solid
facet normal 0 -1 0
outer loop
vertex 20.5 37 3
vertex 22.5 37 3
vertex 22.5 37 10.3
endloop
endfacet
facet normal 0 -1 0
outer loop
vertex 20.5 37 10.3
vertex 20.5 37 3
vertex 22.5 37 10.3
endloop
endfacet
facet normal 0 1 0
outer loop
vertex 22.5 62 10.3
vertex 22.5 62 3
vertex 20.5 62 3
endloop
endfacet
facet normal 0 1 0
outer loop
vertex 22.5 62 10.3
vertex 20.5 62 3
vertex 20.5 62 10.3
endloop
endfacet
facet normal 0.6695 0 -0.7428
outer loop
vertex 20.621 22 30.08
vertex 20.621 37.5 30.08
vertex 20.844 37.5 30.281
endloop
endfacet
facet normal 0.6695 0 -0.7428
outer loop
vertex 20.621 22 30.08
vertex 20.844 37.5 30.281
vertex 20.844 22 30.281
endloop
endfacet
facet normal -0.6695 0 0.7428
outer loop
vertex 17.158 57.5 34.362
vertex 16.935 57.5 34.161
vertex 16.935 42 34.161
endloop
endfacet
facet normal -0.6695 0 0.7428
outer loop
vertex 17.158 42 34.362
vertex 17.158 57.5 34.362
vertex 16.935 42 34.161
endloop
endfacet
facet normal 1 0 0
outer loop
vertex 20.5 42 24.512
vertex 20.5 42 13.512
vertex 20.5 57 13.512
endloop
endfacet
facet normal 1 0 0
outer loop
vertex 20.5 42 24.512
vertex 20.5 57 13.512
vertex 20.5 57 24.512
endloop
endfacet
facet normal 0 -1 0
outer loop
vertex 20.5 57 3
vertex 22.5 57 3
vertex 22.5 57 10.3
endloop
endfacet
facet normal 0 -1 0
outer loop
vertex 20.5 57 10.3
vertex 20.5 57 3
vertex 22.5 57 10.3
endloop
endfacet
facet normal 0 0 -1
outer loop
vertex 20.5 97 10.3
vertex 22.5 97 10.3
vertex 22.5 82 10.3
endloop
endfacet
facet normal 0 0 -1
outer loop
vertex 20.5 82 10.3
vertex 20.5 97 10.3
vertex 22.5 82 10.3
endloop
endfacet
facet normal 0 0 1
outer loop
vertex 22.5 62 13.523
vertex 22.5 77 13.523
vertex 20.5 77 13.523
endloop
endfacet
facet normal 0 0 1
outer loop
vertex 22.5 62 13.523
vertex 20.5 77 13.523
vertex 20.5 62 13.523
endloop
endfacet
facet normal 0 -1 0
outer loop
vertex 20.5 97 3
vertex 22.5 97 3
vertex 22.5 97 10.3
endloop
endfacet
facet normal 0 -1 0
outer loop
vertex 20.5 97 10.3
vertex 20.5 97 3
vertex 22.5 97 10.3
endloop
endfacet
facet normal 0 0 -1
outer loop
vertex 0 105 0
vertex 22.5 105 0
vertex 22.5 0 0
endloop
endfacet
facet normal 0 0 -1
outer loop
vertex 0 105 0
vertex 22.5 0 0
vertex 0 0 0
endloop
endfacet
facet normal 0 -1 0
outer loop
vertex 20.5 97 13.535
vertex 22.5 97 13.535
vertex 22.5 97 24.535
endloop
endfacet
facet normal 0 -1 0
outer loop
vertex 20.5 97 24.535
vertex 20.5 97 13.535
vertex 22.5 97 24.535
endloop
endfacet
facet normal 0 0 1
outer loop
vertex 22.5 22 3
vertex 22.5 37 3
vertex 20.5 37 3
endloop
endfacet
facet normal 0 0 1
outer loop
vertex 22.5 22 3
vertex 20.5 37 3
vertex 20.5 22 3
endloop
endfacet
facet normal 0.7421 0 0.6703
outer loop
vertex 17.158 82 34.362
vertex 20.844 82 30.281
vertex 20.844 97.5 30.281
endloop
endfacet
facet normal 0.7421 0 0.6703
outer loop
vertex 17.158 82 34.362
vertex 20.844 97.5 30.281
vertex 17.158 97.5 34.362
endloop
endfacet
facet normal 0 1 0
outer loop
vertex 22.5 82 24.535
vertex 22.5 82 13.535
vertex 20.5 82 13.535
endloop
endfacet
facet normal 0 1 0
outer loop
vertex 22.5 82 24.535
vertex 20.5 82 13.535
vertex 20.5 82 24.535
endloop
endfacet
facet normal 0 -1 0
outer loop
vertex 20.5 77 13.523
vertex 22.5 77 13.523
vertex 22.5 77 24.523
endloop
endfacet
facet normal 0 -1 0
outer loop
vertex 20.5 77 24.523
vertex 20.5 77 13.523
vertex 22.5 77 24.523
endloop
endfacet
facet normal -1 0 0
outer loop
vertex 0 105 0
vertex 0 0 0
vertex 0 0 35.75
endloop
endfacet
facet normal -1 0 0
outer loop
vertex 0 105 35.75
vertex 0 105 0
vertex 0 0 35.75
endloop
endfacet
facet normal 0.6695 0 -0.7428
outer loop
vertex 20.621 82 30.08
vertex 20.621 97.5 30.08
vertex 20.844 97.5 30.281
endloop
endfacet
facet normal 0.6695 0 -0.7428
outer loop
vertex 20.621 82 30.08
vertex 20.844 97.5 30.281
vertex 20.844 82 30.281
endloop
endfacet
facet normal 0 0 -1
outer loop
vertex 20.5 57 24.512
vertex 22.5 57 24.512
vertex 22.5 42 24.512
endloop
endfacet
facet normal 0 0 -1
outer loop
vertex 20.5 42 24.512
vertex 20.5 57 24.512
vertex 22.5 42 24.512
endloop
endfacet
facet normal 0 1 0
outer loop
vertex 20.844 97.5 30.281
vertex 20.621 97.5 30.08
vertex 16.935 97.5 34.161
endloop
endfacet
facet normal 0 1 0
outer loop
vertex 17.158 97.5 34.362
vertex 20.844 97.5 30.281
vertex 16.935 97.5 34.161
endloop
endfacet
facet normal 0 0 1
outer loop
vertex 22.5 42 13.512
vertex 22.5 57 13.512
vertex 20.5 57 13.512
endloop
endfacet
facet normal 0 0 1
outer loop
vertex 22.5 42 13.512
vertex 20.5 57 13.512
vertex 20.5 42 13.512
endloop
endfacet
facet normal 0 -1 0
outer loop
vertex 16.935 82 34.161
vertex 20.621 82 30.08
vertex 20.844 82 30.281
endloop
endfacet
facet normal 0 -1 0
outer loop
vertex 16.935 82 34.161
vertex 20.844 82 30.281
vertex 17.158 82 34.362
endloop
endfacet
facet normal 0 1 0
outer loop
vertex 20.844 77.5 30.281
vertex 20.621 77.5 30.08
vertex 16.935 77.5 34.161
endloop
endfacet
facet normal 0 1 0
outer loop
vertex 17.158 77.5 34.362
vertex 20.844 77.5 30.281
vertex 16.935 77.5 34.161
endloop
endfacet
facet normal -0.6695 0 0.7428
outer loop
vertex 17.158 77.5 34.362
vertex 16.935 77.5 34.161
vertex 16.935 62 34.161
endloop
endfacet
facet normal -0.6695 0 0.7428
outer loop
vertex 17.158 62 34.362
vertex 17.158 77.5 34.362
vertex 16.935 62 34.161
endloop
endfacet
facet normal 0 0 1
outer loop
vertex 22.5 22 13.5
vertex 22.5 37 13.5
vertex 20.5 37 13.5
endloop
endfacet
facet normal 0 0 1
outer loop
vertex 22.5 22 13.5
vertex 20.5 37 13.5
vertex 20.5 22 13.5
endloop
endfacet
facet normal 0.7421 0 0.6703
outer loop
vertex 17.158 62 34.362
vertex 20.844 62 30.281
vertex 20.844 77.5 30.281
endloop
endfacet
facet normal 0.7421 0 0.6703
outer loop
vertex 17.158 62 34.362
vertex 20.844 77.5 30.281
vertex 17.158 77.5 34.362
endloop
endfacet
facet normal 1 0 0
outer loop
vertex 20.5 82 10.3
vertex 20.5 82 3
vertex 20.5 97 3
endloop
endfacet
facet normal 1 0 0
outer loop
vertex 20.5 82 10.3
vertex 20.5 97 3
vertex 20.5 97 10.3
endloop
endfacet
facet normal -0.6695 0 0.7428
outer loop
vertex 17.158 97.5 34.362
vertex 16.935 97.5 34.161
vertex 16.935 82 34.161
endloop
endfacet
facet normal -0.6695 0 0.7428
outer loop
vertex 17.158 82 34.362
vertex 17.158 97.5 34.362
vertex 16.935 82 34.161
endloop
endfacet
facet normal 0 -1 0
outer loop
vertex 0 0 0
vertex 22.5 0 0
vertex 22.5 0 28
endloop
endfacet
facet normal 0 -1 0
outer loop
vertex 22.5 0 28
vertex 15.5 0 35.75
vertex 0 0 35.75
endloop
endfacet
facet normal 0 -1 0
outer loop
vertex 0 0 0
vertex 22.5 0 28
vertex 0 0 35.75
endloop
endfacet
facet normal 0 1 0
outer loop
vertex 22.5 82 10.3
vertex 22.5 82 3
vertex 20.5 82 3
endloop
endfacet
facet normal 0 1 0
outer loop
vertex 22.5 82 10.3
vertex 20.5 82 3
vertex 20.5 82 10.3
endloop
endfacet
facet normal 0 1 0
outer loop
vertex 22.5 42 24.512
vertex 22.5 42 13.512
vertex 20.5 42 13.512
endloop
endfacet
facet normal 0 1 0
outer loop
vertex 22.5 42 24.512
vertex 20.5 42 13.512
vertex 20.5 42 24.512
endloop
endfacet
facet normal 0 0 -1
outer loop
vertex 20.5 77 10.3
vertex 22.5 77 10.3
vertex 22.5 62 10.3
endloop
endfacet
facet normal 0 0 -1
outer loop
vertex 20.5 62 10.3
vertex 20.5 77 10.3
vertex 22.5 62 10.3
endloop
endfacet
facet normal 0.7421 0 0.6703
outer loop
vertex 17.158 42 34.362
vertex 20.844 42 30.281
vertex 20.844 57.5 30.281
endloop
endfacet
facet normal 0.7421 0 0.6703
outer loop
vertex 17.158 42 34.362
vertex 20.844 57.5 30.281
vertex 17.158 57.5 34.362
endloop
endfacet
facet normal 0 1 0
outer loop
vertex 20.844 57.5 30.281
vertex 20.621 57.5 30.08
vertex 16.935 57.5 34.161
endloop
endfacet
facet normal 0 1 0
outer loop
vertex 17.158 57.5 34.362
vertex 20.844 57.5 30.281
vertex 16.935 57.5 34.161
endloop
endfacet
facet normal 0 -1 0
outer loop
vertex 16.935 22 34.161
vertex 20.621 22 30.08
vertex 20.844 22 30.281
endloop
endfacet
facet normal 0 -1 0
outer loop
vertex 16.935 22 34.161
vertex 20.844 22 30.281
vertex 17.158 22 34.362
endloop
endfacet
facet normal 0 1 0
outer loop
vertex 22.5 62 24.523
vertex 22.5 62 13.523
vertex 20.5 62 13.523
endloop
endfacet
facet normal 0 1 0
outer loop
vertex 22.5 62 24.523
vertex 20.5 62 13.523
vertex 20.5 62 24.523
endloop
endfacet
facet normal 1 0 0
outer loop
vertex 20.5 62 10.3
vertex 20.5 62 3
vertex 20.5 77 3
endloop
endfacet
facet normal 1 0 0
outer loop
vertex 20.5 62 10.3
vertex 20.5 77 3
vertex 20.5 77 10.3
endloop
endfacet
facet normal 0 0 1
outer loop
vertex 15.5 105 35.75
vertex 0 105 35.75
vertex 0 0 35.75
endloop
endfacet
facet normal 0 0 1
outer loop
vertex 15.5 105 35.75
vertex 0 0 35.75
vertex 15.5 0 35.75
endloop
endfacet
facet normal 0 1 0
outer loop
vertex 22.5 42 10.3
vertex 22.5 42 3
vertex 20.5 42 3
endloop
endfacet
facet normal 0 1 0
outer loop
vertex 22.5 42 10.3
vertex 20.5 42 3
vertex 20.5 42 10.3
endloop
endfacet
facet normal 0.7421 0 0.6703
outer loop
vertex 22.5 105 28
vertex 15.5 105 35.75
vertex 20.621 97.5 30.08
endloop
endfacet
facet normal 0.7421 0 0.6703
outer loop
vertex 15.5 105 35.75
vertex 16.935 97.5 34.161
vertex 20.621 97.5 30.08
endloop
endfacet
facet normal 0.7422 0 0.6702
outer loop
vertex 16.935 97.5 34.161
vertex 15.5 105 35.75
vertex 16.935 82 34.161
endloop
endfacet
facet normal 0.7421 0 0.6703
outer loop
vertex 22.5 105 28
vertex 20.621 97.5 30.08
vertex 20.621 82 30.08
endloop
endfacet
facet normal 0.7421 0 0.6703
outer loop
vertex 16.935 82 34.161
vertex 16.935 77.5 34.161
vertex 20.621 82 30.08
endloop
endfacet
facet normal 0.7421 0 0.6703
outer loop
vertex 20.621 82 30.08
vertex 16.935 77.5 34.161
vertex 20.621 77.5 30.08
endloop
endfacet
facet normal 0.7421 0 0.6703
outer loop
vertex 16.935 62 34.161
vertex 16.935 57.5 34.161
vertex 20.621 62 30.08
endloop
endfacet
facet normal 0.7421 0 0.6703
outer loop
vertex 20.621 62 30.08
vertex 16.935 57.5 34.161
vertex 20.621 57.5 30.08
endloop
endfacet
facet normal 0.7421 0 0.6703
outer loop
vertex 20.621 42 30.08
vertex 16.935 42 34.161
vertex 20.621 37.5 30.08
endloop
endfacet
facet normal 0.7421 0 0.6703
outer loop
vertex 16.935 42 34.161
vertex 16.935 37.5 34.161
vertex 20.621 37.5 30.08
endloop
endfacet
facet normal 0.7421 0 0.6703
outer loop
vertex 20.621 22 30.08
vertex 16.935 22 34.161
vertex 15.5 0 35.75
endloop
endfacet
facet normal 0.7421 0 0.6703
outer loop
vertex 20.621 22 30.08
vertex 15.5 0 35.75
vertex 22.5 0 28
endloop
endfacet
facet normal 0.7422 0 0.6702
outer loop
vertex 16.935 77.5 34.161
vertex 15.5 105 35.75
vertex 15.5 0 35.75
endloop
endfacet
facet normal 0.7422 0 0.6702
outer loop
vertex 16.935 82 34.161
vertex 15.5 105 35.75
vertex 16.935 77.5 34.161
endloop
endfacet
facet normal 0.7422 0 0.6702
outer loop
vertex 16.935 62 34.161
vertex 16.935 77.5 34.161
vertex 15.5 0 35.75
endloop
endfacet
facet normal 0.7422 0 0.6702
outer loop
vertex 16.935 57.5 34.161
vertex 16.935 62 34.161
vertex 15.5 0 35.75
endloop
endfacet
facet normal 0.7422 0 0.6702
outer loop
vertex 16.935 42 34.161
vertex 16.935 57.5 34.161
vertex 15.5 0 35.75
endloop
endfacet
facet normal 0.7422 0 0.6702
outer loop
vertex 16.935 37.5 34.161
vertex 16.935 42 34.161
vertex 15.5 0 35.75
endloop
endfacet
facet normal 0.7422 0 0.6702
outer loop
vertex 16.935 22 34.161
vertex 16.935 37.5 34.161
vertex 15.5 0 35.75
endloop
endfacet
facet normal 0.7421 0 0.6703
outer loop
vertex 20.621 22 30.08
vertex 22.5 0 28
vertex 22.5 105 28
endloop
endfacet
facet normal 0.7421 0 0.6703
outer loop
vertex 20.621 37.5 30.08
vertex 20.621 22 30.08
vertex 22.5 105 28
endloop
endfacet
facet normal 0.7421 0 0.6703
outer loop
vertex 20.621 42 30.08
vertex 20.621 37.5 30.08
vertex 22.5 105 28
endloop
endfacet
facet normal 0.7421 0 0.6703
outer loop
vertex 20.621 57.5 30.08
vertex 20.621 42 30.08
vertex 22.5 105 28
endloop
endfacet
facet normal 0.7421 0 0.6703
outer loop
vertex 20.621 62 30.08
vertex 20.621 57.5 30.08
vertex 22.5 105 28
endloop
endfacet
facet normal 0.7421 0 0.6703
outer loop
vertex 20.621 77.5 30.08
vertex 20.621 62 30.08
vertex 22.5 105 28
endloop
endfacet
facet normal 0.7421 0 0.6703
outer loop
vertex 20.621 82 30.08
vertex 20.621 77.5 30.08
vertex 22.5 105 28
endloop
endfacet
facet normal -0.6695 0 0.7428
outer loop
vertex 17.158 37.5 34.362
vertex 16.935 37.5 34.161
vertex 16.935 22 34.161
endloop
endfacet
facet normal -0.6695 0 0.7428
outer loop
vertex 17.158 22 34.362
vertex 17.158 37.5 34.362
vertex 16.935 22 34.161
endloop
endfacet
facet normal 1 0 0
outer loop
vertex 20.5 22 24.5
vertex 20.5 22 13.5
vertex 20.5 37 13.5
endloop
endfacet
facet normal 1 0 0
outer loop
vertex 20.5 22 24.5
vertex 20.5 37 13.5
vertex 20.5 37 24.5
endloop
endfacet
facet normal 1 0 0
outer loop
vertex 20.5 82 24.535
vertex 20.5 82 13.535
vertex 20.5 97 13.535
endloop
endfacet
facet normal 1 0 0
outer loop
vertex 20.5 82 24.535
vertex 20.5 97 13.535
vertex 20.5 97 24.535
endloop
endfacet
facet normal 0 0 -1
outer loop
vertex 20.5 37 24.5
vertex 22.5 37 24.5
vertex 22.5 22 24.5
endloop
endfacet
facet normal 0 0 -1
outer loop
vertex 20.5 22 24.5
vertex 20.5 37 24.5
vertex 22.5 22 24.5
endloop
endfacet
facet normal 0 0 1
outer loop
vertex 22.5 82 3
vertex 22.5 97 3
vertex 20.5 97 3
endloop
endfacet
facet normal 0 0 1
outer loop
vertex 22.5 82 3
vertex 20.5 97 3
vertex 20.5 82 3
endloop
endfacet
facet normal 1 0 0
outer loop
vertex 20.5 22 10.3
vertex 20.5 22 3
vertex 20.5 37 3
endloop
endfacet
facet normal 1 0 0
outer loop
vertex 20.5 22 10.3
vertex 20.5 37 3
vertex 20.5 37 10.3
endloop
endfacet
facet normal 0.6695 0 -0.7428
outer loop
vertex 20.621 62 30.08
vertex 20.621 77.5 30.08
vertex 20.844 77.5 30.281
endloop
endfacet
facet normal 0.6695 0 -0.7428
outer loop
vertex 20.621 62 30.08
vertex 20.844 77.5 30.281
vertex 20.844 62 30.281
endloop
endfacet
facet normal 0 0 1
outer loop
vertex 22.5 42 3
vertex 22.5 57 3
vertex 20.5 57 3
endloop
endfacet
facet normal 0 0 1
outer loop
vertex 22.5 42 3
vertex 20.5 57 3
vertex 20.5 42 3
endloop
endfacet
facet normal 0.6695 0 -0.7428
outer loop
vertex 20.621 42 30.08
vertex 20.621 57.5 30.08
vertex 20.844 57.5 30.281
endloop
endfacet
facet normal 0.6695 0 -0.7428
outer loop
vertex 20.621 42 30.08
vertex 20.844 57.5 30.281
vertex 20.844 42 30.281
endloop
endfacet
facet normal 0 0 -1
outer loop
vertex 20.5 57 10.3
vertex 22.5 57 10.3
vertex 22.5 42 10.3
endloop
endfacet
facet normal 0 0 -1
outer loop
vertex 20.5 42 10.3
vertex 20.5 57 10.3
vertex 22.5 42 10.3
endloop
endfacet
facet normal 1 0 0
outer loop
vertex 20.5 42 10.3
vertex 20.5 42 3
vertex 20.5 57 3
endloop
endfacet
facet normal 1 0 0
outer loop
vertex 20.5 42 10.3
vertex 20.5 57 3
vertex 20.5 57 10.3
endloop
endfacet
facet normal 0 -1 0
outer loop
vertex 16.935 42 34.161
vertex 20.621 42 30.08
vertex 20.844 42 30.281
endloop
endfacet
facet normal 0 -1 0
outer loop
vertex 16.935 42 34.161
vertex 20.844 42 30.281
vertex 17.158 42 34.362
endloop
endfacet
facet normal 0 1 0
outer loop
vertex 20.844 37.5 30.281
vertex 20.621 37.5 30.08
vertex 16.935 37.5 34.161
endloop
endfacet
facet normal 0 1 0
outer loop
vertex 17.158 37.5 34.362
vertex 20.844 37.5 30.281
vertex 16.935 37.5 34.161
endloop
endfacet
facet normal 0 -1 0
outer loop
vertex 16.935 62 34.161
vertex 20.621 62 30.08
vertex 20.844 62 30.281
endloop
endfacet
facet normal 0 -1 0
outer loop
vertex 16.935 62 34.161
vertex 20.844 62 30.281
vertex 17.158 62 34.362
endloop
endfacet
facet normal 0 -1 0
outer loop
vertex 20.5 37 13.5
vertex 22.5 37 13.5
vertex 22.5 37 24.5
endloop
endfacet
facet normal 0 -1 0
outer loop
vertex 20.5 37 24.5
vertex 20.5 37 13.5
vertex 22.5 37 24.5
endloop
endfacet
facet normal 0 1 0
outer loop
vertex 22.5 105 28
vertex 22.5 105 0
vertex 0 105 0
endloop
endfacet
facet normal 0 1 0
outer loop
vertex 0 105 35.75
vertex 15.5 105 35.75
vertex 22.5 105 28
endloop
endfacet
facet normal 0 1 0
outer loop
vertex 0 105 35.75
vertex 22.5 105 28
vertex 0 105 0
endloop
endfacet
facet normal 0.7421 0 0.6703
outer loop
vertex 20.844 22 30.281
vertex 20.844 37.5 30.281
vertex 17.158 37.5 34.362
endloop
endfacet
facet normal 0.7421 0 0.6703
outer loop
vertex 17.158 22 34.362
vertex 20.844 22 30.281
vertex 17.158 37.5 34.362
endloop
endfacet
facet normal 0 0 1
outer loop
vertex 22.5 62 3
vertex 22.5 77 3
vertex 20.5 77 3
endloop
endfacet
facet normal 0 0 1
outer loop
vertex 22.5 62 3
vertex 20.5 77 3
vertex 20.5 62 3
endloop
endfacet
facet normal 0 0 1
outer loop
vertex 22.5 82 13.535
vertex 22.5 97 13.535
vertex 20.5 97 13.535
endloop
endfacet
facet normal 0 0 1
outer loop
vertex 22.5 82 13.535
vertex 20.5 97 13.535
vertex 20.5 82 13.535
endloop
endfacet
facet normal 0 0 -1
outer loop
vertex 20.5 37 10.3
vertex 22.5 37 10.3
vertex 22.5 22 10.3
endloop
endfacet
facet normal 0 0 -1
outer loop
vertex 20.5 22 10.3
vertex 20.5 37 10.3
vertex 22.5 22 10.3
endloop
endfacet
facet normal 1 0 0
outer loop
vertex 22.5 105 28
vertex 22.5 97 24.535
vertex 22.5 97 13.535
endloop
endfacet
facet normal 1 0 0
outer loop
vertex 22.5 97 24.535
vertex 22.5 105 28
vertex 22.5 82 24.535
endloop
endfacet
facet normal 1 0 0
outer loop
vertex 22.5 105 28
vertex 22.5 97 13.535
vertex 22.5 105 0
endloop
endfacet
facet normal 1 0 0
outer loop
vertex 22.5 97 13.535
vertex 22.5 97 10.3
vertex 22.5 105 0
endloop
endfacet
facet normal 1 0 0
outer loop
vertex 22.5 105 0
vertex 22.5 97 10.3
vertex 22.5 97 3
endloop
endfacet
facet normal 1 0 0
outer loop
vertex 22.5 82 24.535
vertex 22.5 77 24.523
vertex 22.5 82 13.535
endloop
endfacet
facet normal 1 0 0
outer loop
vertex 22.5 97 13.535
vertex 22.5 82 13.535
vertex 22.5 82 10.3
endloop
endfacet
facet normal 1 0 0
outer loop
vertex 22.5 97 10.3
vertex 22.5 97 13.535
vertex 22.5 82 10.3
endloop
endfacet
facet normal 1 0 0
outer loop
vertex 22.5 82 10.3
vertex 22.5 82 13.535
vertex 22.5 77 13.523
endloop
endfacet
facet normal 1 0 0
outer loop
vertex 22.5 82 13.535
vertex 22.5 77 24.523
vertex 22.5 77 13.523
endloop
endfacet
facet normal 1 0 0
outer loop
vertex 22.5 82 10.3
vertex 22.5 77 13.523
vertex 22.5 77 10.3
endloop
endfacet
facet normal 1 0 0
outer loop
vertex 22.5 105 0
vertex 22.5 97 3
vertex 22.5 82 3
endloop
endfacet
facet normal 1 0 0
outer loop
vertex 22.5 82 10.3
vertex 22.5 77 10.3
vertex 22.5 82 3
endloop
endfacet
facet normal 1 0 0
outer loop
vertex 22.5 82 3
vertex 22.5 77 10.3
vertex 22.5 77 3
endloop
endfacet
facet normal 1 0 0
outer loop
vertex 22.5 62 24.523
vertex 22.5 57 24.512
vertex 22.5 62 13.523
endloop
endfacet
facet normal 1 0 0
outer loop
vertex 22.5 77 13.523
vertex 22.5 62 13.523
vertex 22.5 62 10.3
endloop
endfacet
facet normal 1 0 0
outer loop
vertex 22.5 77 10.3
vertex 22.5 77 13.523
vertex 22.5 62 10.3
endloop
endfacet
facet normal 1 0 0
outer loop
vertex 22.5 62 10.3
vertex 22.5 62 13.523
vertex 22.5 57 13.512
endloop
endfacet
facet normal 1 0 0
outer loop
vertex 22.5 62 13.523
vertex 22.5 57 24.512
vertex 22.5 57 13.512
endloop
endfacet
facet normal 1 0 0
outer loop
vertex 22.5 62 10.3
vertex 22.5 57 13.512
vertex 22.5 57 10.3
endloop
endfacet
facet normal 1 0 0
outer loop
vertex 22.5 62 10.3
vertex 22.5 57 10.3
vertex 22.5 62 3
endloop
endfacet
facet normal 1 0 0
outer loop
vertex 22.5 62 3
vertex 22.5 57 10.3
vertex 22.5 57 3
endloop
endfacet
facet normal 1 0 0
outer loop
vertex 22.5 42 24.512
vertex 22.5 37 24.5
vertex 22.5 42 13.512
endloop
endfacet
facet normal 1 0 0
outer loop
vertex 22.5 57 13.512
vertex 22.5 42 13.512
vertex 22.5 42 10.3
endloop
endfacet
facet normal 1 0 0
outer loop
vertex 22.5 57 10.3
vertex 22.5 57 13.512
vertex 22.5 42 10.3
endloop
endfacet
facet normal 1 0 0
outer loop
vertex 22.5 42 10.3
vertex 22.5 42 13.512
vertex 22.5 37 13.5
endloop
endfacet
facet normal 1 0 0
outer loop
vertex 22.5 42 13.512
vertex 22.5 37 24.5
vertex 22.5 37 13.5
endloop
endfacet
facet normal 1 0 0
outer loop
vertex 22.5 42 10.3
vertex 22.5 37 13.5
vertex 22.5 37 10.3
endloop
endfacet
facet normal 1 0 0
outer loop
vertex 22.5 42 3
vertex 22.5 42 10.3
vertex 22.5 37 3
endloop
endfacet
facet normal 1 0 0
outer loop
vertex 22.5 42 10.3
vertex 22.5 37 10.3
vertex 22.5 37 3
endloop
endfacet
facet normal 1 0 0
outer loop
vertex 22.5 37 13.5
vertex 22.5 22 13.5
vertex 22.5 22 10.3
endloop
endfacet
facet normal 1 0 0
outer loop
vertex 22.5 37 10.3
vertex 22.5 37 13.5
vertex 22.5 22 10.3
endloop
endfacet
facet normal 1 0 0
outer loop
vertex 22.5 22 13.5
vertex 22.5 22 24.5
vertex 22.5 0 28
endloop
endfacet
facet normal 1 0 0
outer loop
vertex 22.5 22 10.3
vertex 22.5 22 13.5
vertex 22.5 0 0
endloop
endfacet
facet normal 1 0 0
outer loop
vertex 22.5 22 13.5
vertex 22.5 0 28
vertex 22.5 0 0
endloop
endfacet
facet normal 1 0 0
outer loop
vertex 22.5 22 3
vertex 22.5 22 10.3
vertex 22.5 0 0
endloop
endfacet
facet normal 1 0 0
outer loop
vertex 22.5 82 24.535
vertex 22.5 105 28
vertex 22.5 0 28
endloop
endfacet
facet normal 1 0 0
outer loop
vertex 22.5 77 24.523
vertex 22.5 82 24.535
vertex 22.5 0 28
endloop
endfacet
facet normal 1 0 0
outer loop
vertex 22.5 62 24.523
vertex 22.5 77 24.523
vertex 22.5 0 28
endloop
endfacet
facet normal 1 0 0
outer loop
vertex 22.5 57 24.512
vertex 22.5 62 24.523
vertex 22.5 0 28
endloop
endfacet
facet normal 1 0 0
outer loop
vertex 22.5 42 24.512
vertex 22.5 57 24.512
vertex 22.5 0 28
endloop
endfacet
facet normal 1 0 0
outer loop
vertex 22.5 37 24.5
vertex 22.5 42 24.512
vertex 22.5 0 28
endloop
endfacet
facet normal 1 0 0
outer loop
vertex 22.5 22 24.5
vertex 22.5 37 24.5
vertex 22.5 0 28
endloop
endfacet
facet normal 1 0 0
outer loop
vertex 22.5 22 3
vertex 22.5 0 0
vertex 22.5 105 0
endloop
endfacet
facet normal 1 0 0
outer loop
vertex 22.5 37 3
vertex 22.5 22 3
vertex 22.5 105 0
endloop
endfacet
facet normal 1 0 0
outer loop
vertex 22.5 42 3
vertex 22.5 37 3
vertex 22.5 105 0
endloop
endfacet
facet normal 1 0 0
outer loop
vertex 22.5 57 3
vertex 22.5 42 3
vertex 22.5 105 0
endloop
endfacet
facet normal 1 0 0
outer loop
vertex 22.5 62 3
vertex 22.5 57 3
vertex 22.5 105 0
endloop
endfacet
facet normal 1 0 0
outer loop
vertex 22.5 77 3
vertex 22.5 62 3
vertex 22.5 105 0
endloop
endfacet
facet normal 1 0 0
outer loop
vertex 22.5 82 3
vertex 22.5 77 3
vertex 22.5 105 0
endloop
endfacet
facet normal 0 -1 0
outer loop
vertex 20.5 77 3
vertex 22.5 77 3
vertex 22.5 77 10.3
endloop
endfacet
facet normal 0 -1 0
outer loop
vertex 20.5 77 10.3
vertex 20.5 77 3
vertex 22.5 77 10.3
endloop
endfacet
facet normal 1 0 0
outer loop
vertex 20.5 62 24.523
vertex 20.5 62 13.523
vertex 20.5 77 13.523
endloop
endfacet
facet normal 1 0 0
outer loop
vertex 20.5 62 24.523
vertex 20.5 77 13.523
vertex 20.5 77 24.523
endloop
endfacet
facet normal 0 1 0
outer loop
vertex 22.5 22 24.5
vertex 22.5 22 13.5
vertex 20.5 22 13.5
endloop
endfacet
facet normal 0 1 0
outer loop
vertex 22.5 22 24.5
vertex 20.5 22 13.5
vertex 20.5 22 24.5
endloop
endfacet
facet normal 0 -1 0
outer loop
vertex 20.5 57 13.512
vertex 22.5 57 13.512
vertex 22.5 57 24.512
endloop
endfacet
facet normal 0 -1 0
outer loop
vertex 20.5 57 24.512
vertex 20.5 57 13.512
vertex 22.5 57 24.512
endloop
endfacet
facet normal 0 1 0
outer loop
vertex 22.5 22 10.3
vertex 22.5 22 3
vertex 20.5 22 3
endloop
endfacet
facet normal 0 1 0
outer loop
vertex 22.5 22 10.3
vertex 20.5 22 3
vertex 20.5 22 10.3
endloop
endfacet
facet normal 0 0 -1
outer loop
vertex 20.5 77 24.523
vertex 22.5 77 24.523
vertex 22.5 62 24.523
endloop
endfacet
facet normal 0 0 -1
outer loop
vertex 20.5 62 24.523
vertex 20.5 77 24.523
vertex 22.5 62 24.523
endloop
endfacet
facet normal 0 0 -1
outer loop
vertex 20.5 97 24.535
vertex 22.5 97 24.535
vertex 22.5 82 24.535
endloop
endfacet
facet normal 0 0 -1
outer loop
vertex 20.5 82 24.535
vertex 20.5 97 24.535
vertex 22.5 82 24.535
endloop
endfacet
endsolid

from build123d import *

# Parameters (mm, degrees)
PAD002_DEPTH  = 105
SKETCH003_W   = 5.5
SKETCH003_H   = 15.5
PAD003_DEPTH  = 0.3
SKETCH010_W   = 7.3
SKETCH010_H   = 15
SKETCH010_W_2 = 11
POCKET_DEPTH  = 2


with BuildPart() as part:
    # Sketch002 → Pad002 (new body)
    with BuildSketch(Plane.XZ):
        Polygon((0, 35.75), (15.5, 35.75), (22.5, 28), (22.5, 0), (0, 0), align=None)
    extrude(amount=-PAD002_DEPTH)

    # Sketch003 (on Face2 of Pad002) → Pad003 (join)
    with BuildSketch(Plane(origin=(26.3189111748, 0, 23.7719197708), x_dir=(-0.670286258, 0, 0.7421026428), z_dir=(0.7421026428, 0, 0.670286258))):
        with Locations((11.25, -29.75)):
            Rectangle(SKETCH003_W, SKETCH003_H)
        with Locations((11.25, -49.75)):
            Rectangle(SKETCH003_W, SKETCH003_H)
        with Locations((11.25, -69.75)):
            Rectangle(SKETCH003_W, SKETCH003_H)
        with Locations((11.25, -89.75)):
            Rectangle(SKETCH003_W, SKETCH003_H)
    extrude(amount=PAD003_DEPTH)

    # Sketch010 (on Face3 of Pad002) → Pocket (cut)
    with BuildSketch(Plane(origin=(22.5, 0, 0), x_dir=(0, 0, 1), z_dir=(1, 0, 0))):
        with Locations((6.65, -29.5)):
            Rectangle(SKETCH010_W, SKETCH010_H)
        with Locations((6.65, -49.5)):
            Rectangle(SKETCH010_W, SKETCH010_H)
        with Locations((6.65, -69.5)):
            Rectangle(SKETCH010_W, SKETCH010_H)
        with Locations((6.65, -89.5)):
            Rectangle(SKETCH010_W, SKETCH010_H)
        with Locations((19, -29.5)):
            Rectangle(SKETCH010_W_2, SKETCH010_H)
        with Locations((19.0116166835, -49.4999966263)):
            Rectangle(SKETCH010_W_2, SKETCH010_H)
        with Locations((19.023233367, -69.4999932526)):
            Rectangle(SKETCH010_W_2, SKETCH010_H)
        with Locations((19.0348500505, -89.4999898789)):
            Rectangle(SKETCH010_W_2, SKETCH010_H)
    extrude(amount=-POCKET_DEPTH, mode=Mode.SUBTRACT)


solid = part.part
